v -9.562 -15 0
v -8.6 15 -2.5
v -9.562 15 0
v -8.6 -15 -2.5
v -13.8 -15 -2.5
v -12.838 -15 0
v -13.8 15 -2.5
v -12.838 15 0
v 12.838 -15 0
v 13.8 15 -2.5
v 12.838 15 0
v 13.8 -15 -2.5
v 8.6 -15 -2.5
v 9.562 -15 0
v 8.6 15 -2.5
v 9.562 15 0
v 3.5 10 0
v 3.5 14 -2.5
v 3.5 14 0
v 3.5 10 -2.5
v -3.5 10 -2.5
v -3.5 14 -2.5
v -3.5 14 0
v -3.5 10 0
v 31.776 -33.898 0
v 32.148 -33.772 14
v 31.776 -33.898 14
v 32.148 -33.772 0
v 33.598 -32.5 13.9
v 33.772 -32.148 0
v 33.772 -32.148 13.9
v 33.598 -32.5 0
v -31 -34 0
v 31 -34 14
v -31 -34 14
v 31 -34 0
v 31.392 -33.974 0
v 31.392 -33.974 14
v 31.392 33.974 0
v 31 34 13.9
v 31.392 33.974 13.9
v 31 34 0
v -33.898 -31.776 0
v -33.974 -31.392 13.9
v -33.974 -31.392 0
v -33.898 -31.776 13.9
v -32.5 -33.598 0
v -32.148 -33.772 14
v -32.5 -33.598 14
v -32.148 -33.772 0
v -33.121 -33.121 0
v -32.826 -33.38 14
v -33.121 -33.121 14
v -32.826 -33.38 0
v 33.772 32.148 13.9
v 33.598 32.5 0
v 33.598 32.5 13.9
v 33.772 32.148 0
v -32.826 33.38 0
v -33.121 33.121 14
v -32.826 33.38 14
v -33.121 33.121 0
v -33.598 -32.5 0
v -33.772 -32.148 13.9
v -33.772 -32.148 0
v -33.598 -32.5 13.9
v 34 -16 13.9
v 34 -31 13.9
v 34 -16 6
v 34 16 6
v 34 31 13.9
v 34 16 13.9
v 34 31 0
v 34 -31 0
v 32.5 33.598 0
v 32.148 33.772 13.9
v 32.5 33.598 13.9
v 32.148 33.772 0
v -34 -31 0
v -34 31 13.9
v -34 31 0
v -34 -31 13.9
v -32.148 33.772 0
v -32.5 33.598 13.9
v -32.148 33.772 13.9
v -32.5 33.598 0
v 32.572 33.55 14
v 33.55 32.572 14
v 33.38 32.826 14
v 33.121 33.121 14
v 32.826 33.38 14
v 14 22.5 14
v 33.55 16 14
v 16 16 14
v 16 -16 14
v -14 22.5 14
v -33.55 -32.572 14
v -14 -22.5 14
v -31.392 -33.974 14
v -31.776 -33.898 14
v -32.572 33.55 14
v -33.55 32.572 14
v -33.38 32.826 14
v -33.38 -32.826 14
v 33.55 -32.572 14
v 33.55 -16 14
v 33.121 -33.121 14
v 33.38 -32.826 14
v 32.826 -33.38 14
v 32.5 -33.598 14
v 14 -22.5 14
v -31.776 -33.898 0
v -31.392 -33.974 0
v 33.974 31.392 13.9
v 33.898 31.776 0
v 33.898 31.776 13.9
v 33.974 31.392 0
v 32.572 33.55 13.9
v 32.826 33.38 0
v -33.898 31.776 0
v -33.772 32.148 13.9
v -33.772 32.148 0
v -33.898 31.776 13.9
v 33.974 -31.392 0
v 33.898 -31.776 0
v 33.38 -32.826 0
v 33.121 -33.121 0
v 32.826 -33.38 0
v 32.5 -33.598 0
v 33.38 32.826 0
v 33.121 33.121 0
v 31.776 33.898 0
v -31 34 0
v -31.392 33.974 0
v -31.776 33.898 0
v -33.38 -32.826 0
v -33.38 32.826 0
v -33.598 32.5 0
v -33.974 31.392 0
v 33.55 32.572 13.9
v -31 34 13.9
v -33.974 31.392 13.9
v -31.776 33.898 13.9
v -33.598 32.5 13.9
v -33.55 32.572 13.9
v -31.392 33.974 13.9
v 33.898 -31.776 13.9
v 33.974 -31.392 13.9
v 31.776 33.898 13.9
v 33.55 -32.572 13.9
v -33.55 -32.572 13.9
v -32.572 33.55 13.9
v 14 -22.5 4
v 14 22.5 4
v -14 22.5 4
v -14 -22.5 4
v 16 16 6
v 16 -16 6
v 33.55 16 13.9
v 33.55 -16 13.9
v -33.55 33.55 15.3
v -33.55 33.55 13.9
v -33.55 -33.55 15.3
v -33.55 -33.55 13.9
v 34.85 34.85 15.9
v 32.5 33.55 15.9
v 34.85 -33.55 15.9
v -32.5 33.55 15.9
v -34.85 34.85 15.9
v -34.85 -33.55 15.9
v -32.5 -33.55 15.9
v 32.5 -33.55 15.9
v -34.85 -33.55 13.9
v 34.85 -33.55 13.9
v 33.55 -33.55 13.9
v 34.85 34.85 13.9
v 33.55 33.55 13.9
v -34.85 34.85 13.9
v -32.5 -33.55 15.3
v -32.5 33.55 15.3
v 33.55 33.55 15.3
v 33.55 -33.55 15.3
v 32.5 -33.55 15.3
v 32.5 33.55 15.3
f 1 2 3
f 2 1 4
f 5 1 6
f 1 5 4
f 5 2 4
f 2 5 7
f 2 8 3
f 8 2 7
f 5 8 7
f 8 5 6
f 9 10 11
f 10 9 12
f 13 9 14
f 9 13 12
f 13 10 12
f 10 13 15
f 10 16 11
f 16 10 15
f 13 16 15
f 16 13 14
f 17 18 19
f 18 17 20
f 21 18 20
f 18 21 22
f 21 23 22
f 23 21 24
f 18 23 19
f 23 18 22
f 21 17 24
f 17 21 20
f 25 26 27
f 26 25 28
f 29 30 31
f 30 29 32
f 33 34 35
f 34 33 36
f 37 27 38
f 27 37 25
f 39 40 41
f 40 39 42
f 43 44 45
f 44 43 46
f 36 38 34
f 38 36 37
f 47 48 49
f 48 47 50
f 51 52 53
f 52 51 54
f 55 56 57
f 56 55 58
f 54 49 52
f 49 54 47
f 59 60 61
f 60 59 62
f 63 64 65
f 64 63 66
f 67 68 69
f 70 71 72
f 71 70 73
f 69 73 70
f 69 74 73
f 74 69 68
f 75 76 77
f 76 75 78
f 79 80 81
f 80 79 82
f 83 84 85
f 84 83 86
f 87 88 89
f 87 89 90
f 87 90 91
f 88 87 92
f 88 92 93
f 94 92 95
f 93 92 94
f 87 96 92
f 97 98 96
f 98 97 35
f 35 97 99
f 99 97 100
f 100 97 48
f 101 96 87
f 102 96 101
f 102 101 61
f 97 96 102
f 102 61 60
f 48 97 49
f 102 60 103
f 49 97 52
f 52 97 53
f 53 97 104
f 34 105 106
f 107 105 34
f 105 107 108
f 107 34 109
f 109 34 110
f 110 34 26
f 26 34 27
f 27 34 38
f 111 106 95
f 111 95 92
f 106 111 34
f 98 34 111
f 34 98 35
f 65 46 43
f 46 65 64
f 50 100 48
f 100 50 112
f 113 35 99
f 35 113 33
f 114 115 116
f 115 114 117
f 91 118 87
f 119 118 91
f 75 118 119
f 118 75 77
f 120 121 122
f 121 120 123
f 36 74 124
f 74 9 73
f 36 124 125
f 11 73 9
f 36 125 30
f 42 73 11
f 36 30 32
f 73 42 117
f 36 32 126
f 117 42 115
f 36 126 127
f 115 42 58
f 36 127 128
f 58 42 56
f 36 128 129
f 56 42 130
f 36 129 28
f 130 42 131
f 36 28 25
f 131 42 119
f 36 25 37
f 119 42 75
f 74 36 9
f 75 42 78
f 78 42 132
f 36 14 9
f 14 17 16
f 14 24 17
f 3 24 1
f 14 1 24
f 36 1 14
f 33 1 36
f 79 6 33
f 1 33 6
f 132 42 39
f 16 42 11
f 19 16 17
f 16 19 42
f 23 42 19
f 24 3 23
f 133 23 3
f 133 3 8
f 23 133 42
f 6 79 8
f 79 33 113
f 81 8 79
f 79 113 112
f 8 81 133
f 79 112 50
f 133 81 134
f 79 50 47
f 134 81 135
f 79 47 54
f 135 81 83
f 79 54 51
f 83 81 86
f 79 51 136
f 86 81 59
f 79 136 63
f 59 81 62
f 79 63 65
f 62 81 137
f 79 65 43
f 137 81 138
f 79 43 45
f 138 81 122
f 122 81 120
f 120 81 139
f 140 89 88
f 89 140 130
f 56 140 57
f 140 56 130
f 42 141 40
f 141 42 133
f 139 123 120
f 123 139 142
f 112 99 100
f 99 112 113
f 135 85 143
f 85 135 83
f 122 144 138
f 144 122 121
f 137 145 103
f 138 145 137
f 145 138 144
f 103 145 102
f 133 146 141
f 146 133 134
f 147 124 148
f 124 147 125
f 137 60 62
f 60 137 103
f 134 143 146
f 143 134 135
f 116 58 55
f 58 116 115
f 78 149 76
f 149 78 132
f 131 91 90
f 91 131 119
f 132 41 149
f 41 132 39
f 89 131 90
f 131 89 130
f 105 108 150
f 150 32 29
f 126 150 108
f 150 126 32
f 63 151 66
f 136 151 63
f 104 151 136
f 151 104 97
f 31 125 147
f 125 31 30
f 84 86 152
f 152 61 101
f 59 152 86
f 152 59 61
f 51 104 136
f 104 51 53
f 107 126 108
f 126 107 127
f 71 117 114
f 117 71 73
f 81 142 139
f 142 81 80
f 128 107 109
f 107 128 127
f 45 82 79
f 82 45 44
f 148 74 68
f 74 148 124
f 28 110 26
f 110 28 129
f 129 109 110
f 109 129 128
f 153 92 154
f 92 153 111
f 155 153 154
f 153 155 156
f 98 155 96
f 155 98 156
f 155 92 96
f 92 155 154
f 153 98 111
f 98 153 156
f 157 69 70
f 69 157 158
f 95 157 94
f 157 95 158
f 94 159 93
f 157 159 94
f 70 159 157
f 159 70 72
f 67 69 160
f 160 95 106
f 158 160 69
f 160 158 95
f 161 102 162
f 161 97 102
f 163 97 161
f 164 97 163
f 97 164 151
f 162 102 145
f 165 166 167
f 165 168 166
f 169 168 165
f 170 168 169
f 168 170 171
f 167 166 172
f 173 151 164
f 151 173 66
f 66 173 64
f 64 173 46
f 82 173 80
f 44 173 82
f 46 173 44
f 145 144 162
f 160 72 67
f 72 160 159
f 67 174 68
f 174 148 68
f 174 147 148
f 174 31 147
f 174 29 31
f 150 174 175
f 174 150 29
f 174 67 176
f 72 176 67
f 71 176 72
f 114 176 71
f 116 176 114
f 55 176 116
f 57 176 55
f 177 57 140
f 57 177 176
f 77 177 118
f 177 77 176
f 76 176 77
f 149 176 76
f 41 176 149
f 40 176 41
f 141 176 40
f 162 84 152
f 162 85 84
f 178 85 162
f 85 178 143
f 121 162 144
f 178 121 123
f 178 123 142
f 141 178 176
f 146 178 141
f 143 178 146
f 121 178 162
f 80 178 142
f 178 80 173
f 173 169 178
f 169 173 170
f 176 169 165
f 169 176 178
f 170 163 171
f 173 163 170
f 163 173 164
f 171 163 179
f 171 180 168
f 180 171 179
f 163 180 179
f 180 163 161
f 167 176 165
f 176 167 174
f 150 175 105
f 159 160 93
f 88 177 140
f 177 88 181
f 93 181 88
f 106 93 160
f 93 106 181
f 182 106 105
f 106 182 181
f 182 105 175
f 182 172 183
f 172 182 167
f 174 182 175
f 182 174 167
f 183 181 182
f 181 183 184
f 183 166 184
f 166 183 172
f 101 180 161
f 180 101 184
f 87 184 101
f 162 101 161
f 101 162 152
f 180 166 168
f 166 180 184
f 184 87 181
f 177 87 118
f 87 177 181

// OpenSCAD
// file: rm_common.scad
// RobotMind Modular Ecosystem — common library
// Rev A concept for FDM prototyping.
$fn = 48;

// ---- Global mechanical interface ----
RM_DOCK_W = 30;
RM_DOCK_L = 34;
RM_DOCK_H = 5;
RM_RAIL_H = 2.6;
RM_RAIL_W = 3.2;
RM_RAIL_INSET = 3.8;
RM_CLEARANCE = 0.28;   // FDM sliding clearance per side
RM_LATCH_W = 7;
RM_LATCH_L = 9;
RM_LATCH_T = 1.6;
RM_LATCH_HOOK = 1.1;
RM_M3 = 3.3;

module rounded_box(size=[20,20,3], r=2, center=false) {
    x=size[0]; y=size[1]; z=size[2];
    translate(center ? [-x/2,-y/2,-z/2] : [0,0,0])
    linear_extrude(height=z)
      offset(r=r)
      offset(delta=-r)
      square([x,y]);
}

// Male dovetail rail. The simplified trapezoid is robust in FDM and moldable.
module dovetail_rail(len=RM_DOCK_L-4) {
    w=RM_RAIL_W; h=RM_RAIL_H;
    linear_extrude(height=len)
      polygon(points=[[-w/2,0],[w/2,0],[w/2+1.0,h],[-w/2-1.0,h]]);
}

// Female channel cutter, slightly oversized.
module dovetail_channel(len=RM_DOCK_L) {
    w=RM_RAIL_W+2*RM_CLEARANCE; h=RM_RAIL_H+RM_CLEARANCE;
    linear_extrude(height=len)
      polygon(points=[[-w/2,0],[w/2,0],[w/2+1.15,h],[-w/2-1.15,h]]);
}

module male_interface() {
    // Interface origin centered X/Y at the carrier underside (Z=0).
    for (sx=[-1,1])
      translate([sx*(RM_DOCK_W/2-RM_RAIL_INSET), -RM_DOCK_L/2+2, 0.1])
        rotate([-90,0,0]) dovetail_rail();
    // central catch boss engaged by dock latch
    translate([-RM_LATCH_W/2, RM_DOCK_L/2-7, -RM_RAIL_H+0.1])
      cube([RM_LATCH_W,4,RM_RAIL_H]);
}

module dock_body_base() {
    difference(){
      rounded_box([RM_DOCK_W,RM_DOCK_L,RM_DOCK_H],2.2,center=true);
      // open female dovetails from insertion side
      for (sx=[-1,1])
        translate([sx*(RM_DOCK_W/2-RM_RAIL_INSET), -RM_DOCK_L/2-0.2, RM_DOCK_H/2])
          rotate([-90,0,0]) dovetail_channel(len=RM_DOCK_L+1);
      // four M3 mounting holes
      for(x=[-10.5,10.5], y=[-12,12]) translate([x,y,0]) cylinder(h=RM_DOCK_H+2,d=RM_M3,center=true);
      // latch relief window
      translate([-RM_LATCH_W/2-0.5, RM_DOCK_L/2-11, -RM_DOCK_H/2-0.1]) cube([RM_LATCH_W+1,11,RM_DOCK_H+1]);
    }
}

module latch_finger() {
    // flexible cantilever integrated at back of dock
    translate([-RM_LATCH_W/2, RM_DOCK_L/2-11.1, -RM_DOCK_H/2+0.7]) {
      cube([RM_LATCH_W,RM_LATCH_L,RM_LATCH_T]);
      translate([0,RM_LATCH_L-1.4,RM_LATCH_T]) cube([RM_LATCH_W,1.4,RM_LATCH_HOOK]);
      // thumb tab
      translate([-1.2,RM_LATCH_L-0.8,-0.2]) cube([RM_LATCH_W+2.4,3,RM_LATCH_T+0.4]);
    }
}

module universal_dock() {
    union(){ dock_body_base(); latch_finger(); }
}

module sensor_carrier(pcb=[20,20], wall=1.7, floor=1.8, clearance=0.5) {
    // carrier top tray centered; universal male interface below
    W=pcb[0]+2*(wall+clearance);
    L=pcb[1]+2*(wall+clearance);
    union(){
      translate([-W/2,-L/2,0]) difference(){
        rounded_box([W,L,floor+3.1],2);
        translate([wall,wall,floor]) rounded_box([pcb[0]+2*clearance,pcb[1]+2*clearance,5],1.0);
        // cable exit on front edge
        translate([W/2-6,-0.2,floor+0.5]) cube([12,wall+1,3.5]);
      }
      // small retention lips; gentle, printable snap
      for(x=[-W/2+2.2,W/2-2.2], y=[-L/2+2.2,L/2-2.2])
         translate([x,y,floor+2.5]) cylinder(h=1.3,d=2.2);
      male_interface();
    }
}

module tag_insert(tag=[60,60], border=3.0, t=1.0) {
    W=tag[0]+2*border; H=tag[1]+2*border;
    union(){
      translate([-W/2,-H/2,0]) rounded_box([W,H,t],1.2);
      translate([-8,-H/2-4,0]) rounded_box([16,5,t],1.2);
    }
}

module tag_insert_rails(tag=[60,60], border=4, rail=1.5, depth=2.2, clearance=0.25, lip=0.8, lip_t=0.6) {
    W=tag[0]+2*border; H=tag[1]+2*border;
    // Side channels capture the insert; the open -Y end matches the pull tab.
    for(sx=[-1,1]) {
      x=sx>0 ? W/2+clearance : -W/2-clearance-rail;
      translate([x,-H/2-clearance,0]) cube([rail,H+2*clearance+rail,depth]);
      translate([sx>0 ? W/2-lip : -W/2-clearance-rail,-H/2-clearance,depth-lip_t])
        cube([rail+clearance+lip,H+2*clearance+rail,lip_t]);
    }
    // Hard stop at +Y; side lips provide out-of-plane retention.
    translate([-W/2-clearance-rail,H/2+clearance,0]) cube([W+2*(clearance+rail),rail,depth]);
}

module angle_wedge(angle=15) {
    // solid wedge with top angled; child dock can be placed on top by caller
    W=RM_DOCK_W+4; L=RM_DOCK_L+4; min_h=3; dh=tan(angle)*L;
    polyhedron(points=[
      [-W/2,-L/2,0],[W/2,-L/2,0],[W/2,L/2,0],[-W/2,L/2,0],
      [-W/2,-L/2,min_h],[W/2,-L/2,min_h],[W/2,L/2,min_h+dh],[-W/2,L/2,min_h+dh]
    ], faces=[[0,1,2,3],[4,7,6,5],[0,4,5,1],[1,5,6,2],[2,6,7,3],[3,7,4,0]]);
}
// main file
include <rm_common.scad>
// Parametric flat AprilTag + beacon enclosure.
TAG=60;
PCB=[28,45,8]; // provisional beacon PCB envelope; measure actual board before final print.
W=max(TAG+8,PCB[0]+8); H=max(TAG+8,PCB[1]+8); D=14;

difference(){
  union(){
    translate([-W/2,-H/2,0]) rounded_box([W,H,D],3);
    male_interface();
  }
  // rear electronics cavity open to rear side
  translate([-PCB[0]/2,-PCB[1]/2,4]) cube([PCB[0],PCB[1],D+1]);
  // large RF keep-out / ventilation opening behind antenna region
  translate([W/2-18,-16,6]) cube([20,32,D]);
}
// front rails + hard stop for interchangeable tag insert
translate([0,0,D-0.1]) tag_insert_rails([TAG,TAG],border=3.3,rail=1.3,depth=2.0);
